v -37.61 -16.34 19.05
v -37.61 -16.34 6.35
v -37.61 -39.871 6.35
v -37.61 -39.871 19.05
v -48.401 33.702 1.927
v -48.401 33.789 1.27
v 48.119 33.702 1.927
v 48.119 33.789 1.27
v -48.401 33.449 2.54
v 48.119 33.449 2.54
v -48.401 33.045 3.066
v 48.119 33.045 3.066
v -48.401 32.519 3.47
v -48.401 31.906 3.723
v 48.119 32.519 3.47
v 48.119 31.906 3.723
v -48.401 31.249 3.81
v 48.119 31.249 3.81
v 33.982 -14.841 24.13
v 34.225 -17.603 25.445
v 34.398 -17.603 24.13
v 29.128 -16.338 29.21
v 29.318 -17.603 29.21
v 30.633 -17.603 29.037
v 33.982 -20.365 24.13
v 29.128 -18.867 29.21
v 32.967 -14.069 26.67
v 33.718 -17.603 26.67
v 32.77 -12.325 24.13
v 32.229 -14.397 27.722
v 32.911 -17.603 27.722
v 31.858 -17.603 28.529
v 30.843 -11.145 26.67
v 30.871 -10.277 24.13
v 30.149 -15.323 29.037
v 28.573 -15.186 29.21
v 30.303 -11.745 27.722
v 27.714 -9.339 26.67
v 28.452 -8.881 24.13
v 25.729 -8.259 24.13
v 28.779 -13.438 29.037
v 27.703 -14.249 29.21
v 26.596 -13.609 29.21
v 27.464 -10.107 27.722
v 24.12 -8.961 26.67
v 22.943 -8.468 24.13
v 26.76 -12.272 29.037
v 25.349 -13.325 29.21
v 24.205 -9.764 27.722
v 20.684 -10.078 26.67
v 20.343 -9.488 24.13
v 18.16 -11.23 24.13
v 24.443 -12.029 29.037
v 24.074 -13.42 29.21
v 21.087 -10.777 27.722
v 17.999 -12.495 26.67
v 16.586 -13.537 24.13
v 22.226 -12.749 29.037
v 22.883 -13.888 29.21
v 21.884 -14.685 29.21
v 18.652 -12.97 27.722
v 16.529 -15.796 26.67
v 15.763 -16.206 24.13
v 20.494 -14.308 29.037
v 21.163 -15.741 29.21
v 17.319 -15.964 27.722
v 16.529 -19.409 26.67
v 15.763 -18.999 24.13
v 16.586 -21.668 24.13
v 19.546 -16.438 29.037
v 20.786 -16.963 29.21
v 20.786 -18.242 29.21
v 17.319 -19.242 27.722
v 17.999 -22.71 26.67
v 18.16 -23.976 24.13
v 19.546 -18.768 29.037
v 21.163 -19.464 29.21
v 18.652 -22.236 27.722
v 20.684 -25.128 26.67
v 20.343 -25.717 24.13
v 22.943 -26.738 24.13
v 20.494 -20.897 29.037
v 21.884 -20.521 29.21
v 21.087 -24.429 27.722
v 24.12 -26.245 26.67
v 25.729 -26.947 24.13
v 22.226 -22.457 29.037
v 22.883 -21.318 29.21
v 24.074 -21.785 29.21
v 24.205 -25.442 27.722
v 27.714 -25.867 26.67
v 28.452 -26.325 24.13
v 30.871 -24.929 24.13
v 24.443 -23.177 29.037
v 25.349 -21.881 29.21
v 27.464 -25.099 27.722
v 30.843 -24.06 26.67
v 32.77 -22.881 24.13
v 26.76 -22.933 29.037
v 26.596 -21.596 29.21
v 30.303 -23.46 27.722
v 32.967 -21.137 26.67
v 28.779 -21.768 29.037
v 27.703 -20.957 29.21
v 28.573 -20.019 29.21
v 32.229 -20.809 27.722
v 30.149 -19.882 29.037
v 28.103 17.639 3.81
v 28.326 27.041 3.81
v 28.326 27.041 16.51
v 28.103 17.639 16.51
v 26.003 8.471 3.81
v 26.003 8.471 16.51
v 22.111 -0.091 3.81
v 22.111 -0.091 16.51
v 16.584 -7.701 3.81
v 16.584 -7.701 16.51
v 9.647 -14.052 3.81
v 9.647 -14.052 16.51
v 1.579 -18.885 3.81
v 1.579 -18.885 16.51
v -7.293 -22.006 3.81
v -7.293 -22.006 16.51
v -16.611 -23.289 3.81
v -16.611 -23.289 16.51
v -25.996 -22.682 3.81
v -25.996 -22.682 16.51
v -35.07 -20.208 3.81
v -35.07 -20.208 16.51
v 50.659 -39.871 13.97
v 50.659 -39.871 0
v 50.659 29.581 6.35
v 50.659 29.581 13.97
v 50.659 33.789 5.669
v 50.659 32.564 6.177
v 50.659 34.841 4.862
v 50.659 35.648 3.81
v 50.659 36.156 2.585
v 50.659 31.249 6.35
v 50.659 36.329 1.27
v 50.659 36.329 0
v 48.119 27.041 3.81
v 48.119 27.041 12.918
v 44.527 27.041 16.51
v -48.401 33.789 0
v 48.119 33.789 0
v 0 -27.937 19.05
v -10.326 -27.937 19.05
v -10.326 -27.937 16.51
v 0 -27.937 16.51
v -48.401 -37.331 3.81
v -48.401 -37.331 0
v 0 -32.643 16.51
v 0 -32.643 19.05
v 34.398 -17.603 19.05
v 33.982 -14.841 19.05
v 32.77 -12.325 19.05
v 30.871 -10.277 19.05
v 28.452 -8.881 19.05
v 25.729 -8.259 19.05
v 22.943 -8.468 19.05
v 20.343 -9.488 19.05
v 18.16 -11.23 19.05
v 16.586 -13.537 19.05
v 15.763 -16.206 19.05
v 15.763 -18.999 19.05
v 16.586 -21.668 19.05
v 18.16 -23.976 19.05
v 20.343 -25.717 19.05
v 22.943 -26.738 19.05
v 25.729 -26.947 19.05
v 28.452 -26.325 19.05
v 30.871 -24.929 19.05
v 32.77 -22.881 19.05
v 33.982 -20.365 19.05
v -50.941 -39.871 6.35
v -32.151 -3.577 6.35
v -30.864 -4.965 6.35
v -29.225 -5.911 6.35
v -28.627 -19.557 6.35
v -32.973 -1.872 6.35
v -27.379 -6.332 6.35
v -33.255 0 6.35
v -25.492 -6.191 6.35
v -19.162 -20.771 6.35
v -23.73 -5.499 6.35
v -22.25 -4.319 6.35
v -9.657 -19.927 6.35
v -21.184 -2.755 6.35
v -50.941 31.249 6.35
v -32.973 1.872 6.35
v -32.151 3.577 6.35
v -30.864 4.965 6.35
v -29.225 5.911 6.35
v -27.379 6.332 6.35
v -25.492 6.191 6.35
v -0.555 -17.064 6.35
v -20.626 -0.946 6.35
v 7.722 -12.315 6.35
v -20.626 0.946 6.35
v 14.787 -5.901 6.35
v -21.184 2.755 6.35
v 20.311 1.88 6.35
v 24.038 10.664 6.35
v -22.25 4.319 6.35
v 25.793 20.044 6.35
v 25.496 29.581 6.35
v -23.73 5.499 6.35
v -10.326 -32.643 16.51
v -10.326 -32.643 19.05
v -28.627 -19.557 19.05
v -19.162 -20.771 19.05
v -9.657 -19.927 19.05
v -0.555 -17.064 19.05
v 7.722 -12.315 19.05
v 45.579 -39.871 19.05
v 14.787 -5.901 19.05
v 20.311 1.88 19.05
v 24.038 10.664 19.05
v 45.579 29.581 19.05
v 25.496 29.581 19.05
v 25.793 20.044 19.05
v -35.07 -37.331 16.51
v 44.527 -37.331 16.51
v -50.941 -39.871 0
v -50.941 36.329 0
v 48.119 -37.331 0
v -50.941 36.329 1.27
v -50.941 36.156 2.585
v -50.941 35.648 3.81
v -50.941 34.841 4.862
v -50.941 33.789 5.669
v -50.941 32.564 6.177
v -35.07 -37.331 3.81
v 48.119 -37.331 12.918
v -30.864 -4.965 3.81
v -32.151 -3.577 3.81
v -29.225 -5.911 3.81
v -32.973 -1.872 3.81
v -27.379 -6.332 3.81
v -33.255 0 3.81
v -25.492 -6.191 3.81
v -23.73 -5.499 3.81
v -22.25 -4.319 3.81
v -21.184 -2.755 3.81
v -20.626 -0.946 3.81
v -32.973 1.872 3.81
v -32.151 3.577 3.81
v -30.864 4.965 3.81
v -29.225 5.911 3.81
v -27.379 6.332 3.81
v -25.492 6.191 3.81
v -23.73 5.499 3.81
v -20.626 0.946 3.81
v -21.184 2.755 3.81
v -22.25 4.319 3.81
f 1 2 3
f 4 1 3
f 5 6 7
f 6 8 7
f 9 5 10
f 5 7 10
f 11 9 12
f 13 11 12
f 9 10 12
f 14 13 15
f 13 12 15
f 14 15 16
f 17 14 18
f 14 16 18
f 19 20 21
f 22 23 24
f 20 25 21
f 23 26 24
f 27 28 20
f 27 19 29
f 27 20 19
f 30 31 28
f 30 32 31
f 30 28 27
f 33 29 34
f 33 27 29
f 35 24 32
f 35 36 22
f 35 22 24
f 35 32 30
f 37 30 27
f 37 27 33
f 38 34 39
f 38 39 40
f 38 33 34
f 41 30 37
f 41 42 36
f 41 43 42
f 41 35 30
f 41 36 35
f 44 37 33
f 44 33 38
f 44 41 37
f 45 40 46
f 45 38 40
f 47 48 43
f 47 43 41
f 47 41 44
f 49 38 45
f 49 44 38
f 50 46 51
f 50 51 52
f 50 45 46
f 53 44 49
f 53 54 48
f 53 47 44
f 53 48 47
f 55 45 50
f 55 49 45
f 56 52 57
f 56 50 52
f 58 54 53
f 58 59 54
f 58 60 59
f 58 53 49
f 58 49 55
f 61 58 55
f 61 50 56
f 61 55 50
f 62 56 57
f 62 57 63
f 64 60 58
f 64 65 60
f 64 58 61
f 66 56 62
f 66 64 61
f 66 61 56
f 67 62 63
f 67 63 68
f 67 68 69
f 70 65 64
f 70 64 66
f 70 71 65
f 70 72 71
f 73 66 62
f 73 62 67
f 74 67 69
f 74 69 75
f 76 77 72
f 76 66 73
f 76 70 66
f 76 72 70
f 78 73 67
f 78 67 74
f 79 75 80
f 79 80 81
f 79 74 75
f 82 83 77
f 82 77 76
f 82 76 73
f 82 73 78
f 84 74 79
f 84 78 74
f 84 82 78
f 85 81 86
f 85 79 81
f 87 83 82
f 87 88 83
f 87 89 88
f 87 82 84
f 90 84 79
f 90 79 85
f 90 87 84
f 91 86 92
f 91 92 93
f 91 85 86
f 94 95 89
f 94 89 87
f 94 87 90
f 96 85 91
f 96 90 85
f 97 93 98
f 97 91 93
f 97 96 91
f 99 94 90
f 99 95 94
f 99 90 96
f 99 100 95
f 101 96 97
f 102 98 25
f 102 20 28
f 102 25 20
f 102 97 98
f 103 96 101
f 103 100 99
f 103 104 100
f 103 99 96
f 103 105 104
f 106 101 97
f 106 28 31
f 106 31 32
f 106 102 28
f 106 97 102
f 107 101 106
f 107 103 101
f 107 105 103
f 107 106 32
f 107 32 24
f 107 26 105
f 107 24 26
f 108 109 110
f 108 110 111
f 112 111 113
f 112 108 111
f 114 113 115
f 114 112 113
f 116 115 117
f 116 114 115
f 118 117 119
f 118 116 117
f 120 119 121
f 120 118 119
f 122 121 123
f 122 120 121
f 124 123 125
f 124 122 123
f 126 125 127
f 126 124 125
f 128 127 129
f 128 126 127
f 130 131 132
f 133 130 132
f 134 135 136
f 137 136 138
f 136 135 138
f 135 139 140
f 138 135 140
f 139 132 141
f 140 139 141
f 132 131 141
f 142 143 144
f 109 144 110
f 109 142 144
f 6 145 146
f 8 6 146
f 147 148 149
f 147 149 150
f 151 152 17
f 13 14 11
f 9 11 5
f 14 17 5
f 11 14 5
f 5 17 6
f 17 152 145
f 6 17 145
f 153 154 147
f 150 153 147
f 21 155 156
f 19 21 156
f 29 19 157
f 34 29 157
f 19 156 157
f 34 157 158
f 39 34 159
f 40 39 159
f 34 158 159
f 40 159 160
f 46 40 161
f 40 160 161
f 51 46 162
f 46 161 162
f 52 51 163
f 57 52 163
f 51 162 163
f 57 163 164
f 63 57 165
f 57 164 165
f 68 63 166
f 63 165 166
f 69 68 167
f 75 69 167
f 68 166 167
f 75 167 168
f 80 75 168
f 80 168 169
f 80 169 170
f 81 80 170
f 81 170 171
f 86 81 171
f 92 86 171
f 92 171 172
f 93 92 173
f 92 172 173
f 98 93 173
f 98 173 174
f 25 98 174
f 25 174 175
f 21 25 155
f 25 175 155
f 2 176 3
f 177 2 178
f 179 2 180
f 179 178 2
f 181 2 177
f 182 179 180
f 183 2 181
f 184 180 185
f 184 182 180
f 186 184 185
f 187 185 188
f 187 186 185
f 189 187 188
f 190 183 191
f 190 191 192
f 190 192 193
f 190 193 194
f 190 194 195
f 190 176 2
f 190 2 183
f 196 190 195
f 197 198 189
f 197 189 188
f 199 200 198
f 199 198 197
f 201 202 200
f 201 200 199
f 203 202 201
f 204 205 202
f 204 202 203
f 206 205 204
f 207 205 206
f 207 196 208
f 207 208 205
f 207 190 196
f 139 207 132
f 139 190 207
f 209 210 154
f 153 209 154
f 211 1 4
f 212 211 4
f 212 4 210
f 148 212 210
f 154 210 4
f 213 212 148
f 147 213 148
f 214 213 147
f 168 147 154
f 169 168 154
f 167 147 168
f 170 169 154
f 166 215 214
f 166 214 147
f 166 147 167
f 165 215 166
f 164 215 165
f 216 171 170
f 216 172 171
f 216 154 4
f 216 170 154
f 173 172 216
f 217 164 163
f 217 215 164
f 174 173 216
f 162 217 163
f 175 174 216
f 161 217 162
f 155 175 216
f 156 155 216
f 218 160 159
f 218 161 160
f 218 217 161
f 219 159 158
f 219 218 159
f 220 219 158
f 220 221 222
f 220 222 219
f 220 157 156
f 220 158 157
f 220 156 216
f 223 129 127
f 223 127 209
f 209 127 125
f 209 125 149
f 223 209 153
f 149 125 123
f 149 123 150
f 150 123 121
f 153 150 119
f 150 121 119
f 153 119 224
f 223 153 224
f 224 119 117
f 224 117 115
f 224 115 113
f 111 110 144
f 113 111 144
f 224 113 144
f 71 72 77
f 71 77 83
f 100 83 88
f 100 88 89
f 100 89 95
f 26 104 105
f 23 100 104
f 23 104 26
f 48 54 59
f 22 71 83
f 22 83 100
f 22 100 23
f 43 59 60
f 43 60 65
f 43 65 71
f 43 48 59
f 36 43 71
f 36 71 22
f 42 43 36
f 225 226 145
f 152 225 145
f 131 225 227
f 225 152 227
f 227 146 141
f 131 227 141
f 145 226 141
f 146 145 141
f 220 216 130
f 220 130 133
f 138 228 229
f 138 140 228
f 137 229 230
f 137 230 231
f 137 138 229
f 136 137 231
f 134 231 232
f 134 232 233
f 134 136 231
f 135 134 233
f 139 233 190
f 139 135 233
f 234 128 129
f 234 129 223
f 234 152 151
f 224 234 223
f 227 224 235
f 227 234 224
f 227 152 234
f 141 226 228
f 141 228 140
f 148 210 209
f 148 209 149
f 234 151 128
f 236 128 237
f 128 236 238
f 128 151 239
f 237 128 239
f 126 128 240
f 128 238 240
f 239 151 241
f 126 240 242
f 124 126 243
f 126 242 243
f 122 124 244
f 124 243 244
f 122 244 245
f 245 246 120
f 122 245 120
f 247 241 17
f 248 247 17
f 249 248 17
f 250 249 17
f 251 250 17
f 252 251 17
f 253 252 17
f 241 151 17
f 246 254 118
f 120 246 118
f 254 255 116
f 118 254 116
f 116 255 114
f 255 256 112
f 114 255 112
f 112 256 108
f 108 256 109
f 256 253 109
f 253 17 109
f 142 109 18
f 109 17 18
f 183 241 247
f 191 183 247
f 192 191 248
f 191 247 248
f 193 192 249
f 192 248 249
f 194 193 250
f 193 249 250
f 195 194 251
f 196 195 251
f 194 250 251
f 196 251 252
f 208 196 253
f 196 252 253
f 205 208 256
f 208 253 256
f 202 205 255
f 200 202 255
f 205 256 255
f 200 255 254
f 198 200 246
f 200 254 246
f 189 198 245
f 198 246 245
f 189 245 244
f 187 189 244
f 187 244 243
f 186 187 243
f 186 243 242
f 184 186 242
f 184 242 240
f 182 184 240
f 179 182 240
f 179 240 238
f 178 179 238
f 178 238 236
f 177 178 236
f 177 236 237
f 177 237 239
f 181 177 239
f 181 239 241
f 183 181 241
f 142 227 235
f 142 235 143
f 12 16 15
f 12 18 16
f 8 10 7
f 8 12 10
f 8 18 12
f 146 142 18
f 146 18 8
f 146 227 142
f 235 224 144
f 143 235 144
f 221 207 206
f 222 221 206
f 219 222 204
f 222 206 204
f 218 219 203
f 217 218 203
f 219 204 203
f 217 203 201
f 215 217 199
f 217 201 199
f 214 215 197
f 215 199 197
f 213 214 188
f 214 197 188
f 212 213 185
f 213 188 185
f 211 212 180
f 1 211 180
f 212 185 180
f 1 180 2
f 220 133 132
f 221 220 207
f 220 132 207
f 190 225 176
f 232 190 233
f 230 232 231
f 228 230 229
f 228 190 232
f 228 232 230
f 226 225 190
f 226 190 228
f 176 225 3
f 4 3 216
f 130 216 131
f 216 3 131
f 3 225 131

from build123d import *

# Parameters (mm, degrees)
F0_W      = 101.6
F0_H      = 76.2
F1_DEPTH  = 6.35
F3_DEPTH  = 5.334
F4_DEPTH  = 12.7
F5_R      = 5.08
F6_SIZE   = 5.08
F8_T      = -2.54
F9_D      = 12.7
F10_R     = 9.3699791153
F11_DEPTH = 10.16
F12_R     = 5.08
F13_W     = 10.32633055
F13_H     = 4.7064404935
F14_DEPTH = 25.4


with BuildPart() as f1:
    # F0 (on Top) → F1 (new body)
    with BuildSketch(Plane.XY):
        with Locations((-0.1408625394, -1.77114314)):
            Rectangle(F0_W, F0_H)
    extrude(amount=F1_DEPTH)

    # F3 (add): a face of the model
    f3_faces = [f1.faces().sort_by_distance(p)[0] for p in [
        (-0.1408625394, -1.77114314, 0),
    ]]
    extrude(f3_faces, amount=-F3_DEPTH)

    # F2 (on face) → F4 (join)
    with BuildSketch(Plane.XY.offset(6.35)):
        with BuildLine():
            Line((-37.6103334129, -16.3400694728), (-37.6103334129, -39.87114314))
            Line((-37.6103334129, -39.87114314), (50.6591374606, -39.87114314))
            Line((50.6591374606, -39.87114314), (50.6591374606, 29.5811630785))
            Line((50.6591374606, 29.5811630785), (25.4961457103, 29.5811630785))
            ThreePointArc((25.4961457103, 29.5811630785), (7.7217190937, -12.3147544324), (-37.6103334129, -16.3400694728))
        make_face()
    extrude(amount=F4_DEPTH)

    # F5
    f5_edges = [f1.edges().sort_by_distance(p)[0] for p in [
        (-0.140863, 36.328857, 6.35),
    ]]
    fillet(f5_edges, radius=F5_R)

    # F6
    f6_edges = [f1.edges().sort_by_distance(p)[0] for p in [
        (50.659137, -5.14499, 19.05),
    ]]
    chamfer(f6_edges, length=F6_SIZE)

    # F8
    f8_openings = [f1.faces().sort_by_distance(p)[0] for p in [
        (-0.140863, -1.771143, 0),
    ]]
    offset(amount=F8_T, openings=f8_openings, kind=Kind.INTERSECTION)

    # F9 (through all)
    with Locations(Plane.XY.offset(6.35)):
        with Locations((-26.9047711045, 0)):
            Hole(F9_D / 2)

    # F10 (on face) → F11 (join)
    with BuildSketch(Plane.XY.offset(19.05)):
        with Locations((25.0284876674, -17.6028143615)):
            Circle(F10_R)
    extrude(amount=F11_DEPTH)

    # F12
    f12_edges = [f1.edges().sort_by_distance(p)[0] for p in [
        (15.658509, -17.602814, 29.21),
    ]]
    fillet(f12_edges, radius=F12_R)

    # F13 (on face) → F14 (cut)
    with BuildSketch(Plane.XY.offset(19.05)):
        with Locations((-5.163165275, -30.2898483351)):
            Rectangle(F13_W, F13_H)
    extrude(amount=-F14_DEPTH, mode=Mode.SUBTRACT)


solid = f1.part
